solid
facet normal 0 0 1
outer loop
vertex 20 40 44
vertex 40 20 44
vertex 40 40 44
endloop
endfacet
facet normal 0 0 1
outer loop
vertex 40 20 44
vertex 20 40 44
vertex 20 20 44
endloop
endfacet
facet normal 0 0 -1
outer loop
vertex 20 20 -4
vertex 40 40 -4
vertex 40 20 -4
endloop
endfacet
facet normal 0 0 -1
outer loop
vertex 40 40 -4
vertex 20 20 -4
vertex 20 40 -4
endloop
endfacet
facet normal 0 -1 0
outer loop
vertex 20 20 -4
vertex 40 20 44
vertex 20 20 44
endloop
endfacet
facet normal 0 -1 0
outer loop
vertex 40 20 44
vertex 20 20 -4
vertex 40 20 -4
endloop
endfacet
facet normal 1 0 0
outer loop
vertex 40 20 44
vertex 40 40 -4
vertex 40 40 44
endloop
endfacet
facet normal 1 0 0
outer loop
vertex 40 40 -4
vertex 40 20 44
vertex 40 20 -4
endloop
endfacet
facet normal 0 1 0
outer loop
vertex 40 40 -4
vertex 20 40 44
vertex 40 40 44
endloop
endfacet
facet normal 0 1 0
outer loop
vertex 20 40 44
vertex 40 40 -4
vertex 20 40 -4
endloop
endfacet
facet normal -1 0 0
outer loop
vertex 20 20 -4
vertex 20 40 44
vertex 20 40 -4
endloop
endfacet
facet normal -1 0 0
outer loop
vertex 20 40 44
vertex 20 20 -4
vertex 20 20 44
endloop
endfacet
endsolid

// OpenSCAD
/**
 * Martin Egli
 * 2023-06-27
 */

module outerShell(part = 1, th = 40, loc_res = 32) {
    difference() {
        union() {
            translate([0, 0, 0])
            linear_extrude(height = th) import("sketch7korpusOuterShellOut.dxf");
            translate([-10, 10, 0])
            cube([350, 270, 3]);
            translate([-10, 10, th-3])
            cube([350, 270, 3]);
            
            translate([350/2-10, 10, 0])
            cube([3+3, 270, th]);
            translate([-10, 270/2+10, 0])
            cube([350, 3+3, th]);
        }
        translate([0, 0, -1])
        linear_extrude(height = th+2) import("sketch7korpusOuterShellIn.dxf");
        
        // M3 holes
        translate([350/2-10-5, 10+10, 10])
        rotate([0, 90, 0])
        cylinder(d = 3, h = 20, $fn = loc_res);
        translate([350/2-10-5, 10+10, 10+20])
        rotate([0, 90, 0])
        cylinder(d = 3, h = 20, $fn = loc_res);
        
        translate([350/2-10-5, 270+10-10, 10])
        rotate([0, 90, 0])
        cylinder(d = 3, h = 20, $fn = loc_res);
        translate([350/2-10-5, 270+10-10, 10+20])
        rotate([0, 90, 0])
        cylinder(d = 3, h = 20, $fn = loc_res);
        
        translate([10-15, 270/2+20, 10])
        rotate([90, 0, 0])
        cylinder(d = 3, h = 20, $fn = loc_res);
        translate([10-15, 270/2+20, 10+20])
        rotate([90, 0, 0])
        cylinder(d = 3, h = 20, $fn = loc_res);
        
        translate([350-20, 270/2+20, 10])
        rotate([90, 0, 0])
        cylinder(d = 3, h = 20, $fn = loc_res);
        translate([350-20, 270/2+20, 10+20])
        rotate([90, 0, 0])
        cylinder(d = 3, h = 20, $fn = loc_res);
        
        // part cutout
        *if(part == 1) {
            // 1
            *translate([350/2-10, 270/2+10, -1])
            cube([350/2, 270/2, th+2]);
            // 2
            translate([-10, 270/2+10, -1])
            cube([350/2, 270/2, th+2]);
            // 3
            translate([-10, 10, -1])
            cube([350/2, 270/2, th+2]);
            // 4
            translate([350/2-10, 10, -1])
            cube([350/2, 270/2, th+2]);
        } else if(part == 2) {
            // 1
            translate([350/2-10, 270/2+10, -1])
            cube([350/2, 270/2, th+2]);
            // 2
            *translate([-10, 270/2+10, -1])
            cube([350/2, 270/2, th+2]);
            // 3
            translate([-10, 10, -1])
            cube([350/2, 270/2, th+2]);
            // 4
            translate([350/2-10, 10, -1])
            cube([350/2, 270/2, th+2]);
        } else if(part == 3) {
            // 1
            translate([350/2-10, 270/2+10, -1])
            cube([350/2, 270/2, th+2]);
            // 2
            translate([-10, 270/2+10, -1])
            cube([350/2, 270/2, th+2]);
            // 3
            *translate([-10, 10, -1])
            cube([350/2, 270/2, th+2]);
            // 4
            translate([350/2-10, 10, -1])
            cube([350/2, 270/2, th+2]);
        } else { // if(part == 1) {
            // 1
            translate([350/2-10, 270/2+10, -1])
            cube([350/2, 270/2, th+2]);
            // 2
            translate([-10, 270/2+10, -1])
            cube([350/2, 270/2, th+2]);
            // 3
            translate([-10, 10, -1])
            cube([350/2, 270/2, th+2]);
            // 4
            *translate([350/2-10, 10, -1])
            cube([350/2, 270/2, th+2]);
        }
    }
}

module innerSchell(part = 1, th = 40) {
    difference() {
        translate([0, 0, 0])
        linear_extrude(height = th) import("sketch7korpusInnerShellOut.dxf");
        translate([0, 0, -1])
        linear_extrude(height = th+2) import("sketch7korpusInnerShellIn.dxf");
    }
    translate([20, 20, -4])
    cube([20, 20, th+8]);
}

*outerShell(1);
innerSchell(1);
